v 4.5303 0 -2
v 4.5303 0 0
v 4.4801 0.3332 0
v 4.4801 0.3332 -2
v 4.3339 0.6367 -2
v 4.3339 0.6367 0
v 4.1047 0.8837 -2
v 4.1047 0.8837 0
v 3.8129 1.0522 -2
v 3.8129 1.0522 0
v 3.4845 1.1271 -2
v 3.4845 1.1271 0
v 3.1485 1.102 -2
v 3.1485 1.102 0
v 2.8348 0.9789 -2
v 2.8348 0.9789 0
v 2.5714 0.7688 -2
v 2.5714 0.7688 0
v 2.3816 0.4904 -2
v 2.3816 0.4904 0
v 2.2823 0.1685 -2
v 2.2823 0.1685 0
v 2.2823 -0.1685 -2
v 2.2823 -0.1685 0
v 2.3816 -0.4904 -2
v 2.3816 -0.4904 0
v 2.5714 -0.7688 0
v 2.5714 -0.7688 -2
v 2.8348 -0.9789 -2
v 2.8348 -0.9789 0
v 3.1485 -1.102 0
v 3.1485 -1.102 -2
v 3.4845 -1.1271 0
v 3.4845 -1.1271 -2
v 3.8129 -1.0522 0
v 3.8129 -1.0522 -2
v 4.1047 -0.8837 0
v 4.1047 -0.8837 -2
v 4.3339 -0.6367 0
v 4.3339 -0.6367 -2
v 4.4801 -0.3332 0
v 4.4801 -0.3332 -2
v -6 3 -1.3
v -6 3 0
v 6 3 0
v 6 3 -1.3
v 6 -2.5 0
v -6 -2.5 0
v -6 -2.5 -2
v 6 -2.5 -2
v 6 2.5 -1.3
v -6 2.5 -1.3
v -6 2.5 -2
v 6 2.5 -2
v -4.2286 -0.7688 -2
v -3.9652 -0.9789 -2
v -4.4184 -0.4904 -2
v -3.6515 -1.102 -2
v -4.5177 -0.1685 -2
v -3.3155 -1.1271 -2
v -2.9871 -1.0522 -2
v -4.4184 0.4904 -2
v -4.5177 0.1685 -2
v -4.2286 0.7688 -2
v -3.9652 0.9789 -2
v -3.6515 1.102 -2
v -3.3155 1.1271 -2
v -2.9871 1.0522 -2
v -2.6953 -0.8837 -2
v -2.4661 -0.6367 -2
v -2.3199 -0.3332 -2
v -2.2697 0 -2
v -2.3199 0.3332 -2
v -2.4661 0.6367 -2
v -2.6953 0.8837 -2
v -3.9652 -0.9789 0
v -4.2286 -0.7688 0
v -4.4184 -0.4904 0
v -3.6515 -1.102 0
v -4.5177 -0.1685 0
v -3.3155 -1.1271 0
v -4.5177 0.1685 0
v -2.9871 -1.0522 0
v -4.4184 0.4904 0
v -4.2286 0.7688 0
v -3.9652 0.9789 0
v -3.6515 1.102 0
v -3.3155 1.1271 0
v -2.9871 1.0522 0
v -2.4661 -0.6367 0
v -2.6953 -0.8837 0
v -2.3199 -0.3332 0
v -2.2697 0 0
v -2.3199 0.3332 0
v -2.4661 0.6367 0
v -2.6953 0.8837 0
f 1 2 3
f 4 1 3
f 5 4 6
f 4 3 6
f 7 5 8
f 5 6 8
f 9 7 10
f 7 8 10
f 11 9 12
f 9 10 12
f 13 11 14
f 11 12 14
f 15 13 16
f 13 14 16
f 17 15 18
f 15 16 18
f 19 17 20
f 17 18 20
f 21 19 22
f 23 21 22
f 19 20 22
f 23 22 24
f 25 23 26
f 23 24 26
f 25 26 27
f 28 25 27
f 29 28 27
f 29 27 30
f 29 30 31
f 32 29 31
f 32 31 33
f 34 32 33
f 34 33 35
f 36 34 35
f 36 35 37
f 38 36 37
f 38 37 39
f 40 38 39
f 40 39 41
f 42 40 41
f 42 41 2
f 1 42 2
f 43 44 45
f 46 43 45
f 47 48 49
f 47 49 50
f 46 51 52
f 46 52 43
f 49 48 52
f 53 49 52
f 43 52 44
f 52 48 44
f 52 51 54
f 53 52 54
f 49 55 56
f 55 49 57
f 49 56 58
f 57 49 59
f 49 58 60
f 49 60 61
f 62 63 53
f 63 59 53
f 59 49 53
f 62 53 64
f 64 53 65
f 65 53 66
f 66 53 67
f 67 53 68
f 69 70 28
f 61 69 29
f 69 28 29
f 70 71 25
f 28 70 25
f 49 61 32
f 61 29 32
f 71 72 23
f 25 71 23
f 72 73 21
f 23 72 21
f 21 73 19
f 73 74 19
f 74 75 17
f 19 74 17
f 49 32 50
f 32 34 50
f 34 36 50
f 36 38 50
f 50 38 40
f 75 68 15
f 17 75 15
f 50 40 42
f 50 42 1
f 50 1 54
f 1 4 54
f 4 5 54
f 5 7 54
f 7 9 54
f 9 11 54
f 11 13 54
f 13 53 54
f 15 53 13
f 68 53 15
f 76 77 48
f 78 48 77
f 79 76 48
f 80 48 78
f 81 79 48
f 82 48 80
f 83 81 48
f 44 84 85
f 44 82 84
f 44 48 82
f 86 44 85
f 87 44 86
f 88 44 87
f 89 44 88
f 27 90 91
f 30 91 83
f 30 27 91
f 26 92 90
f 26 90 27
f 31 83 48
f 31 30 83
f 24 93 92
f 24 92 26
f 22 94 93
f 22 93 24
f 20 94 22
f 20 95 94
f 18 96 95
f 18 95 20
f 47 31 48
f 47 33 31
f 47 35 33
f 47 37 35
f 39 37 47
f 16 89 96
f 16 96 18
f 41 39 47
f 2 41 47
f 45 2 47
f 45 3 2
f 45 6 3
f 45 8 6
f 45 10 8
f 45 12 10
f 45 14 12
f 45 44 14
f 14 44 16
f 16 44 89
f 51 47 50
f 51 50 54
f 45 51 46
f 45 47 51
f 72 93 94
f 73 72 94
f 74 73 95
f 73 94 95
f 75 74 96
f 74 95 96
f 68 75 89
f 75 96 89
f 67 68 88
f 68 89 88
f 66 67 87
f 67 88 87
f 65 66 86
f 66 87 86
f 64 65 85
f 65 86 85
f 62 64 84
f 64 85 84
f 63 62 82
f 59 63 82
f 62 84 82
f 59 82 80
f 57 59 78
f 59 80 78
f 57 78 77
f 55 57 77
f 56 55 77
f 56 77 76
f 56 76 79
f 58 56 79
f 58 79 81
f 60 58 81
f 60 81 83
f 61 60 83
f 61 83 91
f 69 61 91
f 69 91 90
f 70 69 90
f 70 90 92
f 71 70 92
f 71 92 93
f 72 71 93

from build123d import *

# Parameters (mm, degrees)
SKETCH1_W      = 12
SKETCH1_H      = 5.5
EXTRUDE1_DEPTH = 2
SKETCH2_R      = 1.1303
EXTRUDE2_DEPTH = 3
SKETCH3_W      = 0.7
SKETCH3_H      = 0.5
EXTRUDE3_DEPTH = 13


with BuildPart() as part:
    # Sketch1 → Extrude1 (new body)
    with BuildSketch(Plane.XY):
        with Locations((0, 0.25)):
            Rectangle(SKETCH1_W, SKETCH1_H)
    extrude(amount=-EXTRUDE1_DEPTH)

    # Sketch2 → Extrude2 (cut, through all)
    with BuildSketch(Plane.XY):
        with Locations((-3.4, 0)):
            Circle(SKETCH2_R)
        with Locations((3.4, 0)):
            Circle(SKETCH2_R)
    extrude(amount=-EXTRUDE2_DEPTH, mode=Mode.SUBTRACT)

    # Sketch3 → Extrude3 (cut, through all)
    with BuildSketch(Plane(origin=(6, 0, 0), x_dir=(0, 0, -1), z_dir=(1, 0, 0))):
        with Locations((1.65, 2.75)):
            Rectangle(SKETCH3_W, SKETCH3_H)
    extrude(amount=-EXTRUDE3_DEPTH, mode=Mode.SUBTRACT)


solid = part.part
